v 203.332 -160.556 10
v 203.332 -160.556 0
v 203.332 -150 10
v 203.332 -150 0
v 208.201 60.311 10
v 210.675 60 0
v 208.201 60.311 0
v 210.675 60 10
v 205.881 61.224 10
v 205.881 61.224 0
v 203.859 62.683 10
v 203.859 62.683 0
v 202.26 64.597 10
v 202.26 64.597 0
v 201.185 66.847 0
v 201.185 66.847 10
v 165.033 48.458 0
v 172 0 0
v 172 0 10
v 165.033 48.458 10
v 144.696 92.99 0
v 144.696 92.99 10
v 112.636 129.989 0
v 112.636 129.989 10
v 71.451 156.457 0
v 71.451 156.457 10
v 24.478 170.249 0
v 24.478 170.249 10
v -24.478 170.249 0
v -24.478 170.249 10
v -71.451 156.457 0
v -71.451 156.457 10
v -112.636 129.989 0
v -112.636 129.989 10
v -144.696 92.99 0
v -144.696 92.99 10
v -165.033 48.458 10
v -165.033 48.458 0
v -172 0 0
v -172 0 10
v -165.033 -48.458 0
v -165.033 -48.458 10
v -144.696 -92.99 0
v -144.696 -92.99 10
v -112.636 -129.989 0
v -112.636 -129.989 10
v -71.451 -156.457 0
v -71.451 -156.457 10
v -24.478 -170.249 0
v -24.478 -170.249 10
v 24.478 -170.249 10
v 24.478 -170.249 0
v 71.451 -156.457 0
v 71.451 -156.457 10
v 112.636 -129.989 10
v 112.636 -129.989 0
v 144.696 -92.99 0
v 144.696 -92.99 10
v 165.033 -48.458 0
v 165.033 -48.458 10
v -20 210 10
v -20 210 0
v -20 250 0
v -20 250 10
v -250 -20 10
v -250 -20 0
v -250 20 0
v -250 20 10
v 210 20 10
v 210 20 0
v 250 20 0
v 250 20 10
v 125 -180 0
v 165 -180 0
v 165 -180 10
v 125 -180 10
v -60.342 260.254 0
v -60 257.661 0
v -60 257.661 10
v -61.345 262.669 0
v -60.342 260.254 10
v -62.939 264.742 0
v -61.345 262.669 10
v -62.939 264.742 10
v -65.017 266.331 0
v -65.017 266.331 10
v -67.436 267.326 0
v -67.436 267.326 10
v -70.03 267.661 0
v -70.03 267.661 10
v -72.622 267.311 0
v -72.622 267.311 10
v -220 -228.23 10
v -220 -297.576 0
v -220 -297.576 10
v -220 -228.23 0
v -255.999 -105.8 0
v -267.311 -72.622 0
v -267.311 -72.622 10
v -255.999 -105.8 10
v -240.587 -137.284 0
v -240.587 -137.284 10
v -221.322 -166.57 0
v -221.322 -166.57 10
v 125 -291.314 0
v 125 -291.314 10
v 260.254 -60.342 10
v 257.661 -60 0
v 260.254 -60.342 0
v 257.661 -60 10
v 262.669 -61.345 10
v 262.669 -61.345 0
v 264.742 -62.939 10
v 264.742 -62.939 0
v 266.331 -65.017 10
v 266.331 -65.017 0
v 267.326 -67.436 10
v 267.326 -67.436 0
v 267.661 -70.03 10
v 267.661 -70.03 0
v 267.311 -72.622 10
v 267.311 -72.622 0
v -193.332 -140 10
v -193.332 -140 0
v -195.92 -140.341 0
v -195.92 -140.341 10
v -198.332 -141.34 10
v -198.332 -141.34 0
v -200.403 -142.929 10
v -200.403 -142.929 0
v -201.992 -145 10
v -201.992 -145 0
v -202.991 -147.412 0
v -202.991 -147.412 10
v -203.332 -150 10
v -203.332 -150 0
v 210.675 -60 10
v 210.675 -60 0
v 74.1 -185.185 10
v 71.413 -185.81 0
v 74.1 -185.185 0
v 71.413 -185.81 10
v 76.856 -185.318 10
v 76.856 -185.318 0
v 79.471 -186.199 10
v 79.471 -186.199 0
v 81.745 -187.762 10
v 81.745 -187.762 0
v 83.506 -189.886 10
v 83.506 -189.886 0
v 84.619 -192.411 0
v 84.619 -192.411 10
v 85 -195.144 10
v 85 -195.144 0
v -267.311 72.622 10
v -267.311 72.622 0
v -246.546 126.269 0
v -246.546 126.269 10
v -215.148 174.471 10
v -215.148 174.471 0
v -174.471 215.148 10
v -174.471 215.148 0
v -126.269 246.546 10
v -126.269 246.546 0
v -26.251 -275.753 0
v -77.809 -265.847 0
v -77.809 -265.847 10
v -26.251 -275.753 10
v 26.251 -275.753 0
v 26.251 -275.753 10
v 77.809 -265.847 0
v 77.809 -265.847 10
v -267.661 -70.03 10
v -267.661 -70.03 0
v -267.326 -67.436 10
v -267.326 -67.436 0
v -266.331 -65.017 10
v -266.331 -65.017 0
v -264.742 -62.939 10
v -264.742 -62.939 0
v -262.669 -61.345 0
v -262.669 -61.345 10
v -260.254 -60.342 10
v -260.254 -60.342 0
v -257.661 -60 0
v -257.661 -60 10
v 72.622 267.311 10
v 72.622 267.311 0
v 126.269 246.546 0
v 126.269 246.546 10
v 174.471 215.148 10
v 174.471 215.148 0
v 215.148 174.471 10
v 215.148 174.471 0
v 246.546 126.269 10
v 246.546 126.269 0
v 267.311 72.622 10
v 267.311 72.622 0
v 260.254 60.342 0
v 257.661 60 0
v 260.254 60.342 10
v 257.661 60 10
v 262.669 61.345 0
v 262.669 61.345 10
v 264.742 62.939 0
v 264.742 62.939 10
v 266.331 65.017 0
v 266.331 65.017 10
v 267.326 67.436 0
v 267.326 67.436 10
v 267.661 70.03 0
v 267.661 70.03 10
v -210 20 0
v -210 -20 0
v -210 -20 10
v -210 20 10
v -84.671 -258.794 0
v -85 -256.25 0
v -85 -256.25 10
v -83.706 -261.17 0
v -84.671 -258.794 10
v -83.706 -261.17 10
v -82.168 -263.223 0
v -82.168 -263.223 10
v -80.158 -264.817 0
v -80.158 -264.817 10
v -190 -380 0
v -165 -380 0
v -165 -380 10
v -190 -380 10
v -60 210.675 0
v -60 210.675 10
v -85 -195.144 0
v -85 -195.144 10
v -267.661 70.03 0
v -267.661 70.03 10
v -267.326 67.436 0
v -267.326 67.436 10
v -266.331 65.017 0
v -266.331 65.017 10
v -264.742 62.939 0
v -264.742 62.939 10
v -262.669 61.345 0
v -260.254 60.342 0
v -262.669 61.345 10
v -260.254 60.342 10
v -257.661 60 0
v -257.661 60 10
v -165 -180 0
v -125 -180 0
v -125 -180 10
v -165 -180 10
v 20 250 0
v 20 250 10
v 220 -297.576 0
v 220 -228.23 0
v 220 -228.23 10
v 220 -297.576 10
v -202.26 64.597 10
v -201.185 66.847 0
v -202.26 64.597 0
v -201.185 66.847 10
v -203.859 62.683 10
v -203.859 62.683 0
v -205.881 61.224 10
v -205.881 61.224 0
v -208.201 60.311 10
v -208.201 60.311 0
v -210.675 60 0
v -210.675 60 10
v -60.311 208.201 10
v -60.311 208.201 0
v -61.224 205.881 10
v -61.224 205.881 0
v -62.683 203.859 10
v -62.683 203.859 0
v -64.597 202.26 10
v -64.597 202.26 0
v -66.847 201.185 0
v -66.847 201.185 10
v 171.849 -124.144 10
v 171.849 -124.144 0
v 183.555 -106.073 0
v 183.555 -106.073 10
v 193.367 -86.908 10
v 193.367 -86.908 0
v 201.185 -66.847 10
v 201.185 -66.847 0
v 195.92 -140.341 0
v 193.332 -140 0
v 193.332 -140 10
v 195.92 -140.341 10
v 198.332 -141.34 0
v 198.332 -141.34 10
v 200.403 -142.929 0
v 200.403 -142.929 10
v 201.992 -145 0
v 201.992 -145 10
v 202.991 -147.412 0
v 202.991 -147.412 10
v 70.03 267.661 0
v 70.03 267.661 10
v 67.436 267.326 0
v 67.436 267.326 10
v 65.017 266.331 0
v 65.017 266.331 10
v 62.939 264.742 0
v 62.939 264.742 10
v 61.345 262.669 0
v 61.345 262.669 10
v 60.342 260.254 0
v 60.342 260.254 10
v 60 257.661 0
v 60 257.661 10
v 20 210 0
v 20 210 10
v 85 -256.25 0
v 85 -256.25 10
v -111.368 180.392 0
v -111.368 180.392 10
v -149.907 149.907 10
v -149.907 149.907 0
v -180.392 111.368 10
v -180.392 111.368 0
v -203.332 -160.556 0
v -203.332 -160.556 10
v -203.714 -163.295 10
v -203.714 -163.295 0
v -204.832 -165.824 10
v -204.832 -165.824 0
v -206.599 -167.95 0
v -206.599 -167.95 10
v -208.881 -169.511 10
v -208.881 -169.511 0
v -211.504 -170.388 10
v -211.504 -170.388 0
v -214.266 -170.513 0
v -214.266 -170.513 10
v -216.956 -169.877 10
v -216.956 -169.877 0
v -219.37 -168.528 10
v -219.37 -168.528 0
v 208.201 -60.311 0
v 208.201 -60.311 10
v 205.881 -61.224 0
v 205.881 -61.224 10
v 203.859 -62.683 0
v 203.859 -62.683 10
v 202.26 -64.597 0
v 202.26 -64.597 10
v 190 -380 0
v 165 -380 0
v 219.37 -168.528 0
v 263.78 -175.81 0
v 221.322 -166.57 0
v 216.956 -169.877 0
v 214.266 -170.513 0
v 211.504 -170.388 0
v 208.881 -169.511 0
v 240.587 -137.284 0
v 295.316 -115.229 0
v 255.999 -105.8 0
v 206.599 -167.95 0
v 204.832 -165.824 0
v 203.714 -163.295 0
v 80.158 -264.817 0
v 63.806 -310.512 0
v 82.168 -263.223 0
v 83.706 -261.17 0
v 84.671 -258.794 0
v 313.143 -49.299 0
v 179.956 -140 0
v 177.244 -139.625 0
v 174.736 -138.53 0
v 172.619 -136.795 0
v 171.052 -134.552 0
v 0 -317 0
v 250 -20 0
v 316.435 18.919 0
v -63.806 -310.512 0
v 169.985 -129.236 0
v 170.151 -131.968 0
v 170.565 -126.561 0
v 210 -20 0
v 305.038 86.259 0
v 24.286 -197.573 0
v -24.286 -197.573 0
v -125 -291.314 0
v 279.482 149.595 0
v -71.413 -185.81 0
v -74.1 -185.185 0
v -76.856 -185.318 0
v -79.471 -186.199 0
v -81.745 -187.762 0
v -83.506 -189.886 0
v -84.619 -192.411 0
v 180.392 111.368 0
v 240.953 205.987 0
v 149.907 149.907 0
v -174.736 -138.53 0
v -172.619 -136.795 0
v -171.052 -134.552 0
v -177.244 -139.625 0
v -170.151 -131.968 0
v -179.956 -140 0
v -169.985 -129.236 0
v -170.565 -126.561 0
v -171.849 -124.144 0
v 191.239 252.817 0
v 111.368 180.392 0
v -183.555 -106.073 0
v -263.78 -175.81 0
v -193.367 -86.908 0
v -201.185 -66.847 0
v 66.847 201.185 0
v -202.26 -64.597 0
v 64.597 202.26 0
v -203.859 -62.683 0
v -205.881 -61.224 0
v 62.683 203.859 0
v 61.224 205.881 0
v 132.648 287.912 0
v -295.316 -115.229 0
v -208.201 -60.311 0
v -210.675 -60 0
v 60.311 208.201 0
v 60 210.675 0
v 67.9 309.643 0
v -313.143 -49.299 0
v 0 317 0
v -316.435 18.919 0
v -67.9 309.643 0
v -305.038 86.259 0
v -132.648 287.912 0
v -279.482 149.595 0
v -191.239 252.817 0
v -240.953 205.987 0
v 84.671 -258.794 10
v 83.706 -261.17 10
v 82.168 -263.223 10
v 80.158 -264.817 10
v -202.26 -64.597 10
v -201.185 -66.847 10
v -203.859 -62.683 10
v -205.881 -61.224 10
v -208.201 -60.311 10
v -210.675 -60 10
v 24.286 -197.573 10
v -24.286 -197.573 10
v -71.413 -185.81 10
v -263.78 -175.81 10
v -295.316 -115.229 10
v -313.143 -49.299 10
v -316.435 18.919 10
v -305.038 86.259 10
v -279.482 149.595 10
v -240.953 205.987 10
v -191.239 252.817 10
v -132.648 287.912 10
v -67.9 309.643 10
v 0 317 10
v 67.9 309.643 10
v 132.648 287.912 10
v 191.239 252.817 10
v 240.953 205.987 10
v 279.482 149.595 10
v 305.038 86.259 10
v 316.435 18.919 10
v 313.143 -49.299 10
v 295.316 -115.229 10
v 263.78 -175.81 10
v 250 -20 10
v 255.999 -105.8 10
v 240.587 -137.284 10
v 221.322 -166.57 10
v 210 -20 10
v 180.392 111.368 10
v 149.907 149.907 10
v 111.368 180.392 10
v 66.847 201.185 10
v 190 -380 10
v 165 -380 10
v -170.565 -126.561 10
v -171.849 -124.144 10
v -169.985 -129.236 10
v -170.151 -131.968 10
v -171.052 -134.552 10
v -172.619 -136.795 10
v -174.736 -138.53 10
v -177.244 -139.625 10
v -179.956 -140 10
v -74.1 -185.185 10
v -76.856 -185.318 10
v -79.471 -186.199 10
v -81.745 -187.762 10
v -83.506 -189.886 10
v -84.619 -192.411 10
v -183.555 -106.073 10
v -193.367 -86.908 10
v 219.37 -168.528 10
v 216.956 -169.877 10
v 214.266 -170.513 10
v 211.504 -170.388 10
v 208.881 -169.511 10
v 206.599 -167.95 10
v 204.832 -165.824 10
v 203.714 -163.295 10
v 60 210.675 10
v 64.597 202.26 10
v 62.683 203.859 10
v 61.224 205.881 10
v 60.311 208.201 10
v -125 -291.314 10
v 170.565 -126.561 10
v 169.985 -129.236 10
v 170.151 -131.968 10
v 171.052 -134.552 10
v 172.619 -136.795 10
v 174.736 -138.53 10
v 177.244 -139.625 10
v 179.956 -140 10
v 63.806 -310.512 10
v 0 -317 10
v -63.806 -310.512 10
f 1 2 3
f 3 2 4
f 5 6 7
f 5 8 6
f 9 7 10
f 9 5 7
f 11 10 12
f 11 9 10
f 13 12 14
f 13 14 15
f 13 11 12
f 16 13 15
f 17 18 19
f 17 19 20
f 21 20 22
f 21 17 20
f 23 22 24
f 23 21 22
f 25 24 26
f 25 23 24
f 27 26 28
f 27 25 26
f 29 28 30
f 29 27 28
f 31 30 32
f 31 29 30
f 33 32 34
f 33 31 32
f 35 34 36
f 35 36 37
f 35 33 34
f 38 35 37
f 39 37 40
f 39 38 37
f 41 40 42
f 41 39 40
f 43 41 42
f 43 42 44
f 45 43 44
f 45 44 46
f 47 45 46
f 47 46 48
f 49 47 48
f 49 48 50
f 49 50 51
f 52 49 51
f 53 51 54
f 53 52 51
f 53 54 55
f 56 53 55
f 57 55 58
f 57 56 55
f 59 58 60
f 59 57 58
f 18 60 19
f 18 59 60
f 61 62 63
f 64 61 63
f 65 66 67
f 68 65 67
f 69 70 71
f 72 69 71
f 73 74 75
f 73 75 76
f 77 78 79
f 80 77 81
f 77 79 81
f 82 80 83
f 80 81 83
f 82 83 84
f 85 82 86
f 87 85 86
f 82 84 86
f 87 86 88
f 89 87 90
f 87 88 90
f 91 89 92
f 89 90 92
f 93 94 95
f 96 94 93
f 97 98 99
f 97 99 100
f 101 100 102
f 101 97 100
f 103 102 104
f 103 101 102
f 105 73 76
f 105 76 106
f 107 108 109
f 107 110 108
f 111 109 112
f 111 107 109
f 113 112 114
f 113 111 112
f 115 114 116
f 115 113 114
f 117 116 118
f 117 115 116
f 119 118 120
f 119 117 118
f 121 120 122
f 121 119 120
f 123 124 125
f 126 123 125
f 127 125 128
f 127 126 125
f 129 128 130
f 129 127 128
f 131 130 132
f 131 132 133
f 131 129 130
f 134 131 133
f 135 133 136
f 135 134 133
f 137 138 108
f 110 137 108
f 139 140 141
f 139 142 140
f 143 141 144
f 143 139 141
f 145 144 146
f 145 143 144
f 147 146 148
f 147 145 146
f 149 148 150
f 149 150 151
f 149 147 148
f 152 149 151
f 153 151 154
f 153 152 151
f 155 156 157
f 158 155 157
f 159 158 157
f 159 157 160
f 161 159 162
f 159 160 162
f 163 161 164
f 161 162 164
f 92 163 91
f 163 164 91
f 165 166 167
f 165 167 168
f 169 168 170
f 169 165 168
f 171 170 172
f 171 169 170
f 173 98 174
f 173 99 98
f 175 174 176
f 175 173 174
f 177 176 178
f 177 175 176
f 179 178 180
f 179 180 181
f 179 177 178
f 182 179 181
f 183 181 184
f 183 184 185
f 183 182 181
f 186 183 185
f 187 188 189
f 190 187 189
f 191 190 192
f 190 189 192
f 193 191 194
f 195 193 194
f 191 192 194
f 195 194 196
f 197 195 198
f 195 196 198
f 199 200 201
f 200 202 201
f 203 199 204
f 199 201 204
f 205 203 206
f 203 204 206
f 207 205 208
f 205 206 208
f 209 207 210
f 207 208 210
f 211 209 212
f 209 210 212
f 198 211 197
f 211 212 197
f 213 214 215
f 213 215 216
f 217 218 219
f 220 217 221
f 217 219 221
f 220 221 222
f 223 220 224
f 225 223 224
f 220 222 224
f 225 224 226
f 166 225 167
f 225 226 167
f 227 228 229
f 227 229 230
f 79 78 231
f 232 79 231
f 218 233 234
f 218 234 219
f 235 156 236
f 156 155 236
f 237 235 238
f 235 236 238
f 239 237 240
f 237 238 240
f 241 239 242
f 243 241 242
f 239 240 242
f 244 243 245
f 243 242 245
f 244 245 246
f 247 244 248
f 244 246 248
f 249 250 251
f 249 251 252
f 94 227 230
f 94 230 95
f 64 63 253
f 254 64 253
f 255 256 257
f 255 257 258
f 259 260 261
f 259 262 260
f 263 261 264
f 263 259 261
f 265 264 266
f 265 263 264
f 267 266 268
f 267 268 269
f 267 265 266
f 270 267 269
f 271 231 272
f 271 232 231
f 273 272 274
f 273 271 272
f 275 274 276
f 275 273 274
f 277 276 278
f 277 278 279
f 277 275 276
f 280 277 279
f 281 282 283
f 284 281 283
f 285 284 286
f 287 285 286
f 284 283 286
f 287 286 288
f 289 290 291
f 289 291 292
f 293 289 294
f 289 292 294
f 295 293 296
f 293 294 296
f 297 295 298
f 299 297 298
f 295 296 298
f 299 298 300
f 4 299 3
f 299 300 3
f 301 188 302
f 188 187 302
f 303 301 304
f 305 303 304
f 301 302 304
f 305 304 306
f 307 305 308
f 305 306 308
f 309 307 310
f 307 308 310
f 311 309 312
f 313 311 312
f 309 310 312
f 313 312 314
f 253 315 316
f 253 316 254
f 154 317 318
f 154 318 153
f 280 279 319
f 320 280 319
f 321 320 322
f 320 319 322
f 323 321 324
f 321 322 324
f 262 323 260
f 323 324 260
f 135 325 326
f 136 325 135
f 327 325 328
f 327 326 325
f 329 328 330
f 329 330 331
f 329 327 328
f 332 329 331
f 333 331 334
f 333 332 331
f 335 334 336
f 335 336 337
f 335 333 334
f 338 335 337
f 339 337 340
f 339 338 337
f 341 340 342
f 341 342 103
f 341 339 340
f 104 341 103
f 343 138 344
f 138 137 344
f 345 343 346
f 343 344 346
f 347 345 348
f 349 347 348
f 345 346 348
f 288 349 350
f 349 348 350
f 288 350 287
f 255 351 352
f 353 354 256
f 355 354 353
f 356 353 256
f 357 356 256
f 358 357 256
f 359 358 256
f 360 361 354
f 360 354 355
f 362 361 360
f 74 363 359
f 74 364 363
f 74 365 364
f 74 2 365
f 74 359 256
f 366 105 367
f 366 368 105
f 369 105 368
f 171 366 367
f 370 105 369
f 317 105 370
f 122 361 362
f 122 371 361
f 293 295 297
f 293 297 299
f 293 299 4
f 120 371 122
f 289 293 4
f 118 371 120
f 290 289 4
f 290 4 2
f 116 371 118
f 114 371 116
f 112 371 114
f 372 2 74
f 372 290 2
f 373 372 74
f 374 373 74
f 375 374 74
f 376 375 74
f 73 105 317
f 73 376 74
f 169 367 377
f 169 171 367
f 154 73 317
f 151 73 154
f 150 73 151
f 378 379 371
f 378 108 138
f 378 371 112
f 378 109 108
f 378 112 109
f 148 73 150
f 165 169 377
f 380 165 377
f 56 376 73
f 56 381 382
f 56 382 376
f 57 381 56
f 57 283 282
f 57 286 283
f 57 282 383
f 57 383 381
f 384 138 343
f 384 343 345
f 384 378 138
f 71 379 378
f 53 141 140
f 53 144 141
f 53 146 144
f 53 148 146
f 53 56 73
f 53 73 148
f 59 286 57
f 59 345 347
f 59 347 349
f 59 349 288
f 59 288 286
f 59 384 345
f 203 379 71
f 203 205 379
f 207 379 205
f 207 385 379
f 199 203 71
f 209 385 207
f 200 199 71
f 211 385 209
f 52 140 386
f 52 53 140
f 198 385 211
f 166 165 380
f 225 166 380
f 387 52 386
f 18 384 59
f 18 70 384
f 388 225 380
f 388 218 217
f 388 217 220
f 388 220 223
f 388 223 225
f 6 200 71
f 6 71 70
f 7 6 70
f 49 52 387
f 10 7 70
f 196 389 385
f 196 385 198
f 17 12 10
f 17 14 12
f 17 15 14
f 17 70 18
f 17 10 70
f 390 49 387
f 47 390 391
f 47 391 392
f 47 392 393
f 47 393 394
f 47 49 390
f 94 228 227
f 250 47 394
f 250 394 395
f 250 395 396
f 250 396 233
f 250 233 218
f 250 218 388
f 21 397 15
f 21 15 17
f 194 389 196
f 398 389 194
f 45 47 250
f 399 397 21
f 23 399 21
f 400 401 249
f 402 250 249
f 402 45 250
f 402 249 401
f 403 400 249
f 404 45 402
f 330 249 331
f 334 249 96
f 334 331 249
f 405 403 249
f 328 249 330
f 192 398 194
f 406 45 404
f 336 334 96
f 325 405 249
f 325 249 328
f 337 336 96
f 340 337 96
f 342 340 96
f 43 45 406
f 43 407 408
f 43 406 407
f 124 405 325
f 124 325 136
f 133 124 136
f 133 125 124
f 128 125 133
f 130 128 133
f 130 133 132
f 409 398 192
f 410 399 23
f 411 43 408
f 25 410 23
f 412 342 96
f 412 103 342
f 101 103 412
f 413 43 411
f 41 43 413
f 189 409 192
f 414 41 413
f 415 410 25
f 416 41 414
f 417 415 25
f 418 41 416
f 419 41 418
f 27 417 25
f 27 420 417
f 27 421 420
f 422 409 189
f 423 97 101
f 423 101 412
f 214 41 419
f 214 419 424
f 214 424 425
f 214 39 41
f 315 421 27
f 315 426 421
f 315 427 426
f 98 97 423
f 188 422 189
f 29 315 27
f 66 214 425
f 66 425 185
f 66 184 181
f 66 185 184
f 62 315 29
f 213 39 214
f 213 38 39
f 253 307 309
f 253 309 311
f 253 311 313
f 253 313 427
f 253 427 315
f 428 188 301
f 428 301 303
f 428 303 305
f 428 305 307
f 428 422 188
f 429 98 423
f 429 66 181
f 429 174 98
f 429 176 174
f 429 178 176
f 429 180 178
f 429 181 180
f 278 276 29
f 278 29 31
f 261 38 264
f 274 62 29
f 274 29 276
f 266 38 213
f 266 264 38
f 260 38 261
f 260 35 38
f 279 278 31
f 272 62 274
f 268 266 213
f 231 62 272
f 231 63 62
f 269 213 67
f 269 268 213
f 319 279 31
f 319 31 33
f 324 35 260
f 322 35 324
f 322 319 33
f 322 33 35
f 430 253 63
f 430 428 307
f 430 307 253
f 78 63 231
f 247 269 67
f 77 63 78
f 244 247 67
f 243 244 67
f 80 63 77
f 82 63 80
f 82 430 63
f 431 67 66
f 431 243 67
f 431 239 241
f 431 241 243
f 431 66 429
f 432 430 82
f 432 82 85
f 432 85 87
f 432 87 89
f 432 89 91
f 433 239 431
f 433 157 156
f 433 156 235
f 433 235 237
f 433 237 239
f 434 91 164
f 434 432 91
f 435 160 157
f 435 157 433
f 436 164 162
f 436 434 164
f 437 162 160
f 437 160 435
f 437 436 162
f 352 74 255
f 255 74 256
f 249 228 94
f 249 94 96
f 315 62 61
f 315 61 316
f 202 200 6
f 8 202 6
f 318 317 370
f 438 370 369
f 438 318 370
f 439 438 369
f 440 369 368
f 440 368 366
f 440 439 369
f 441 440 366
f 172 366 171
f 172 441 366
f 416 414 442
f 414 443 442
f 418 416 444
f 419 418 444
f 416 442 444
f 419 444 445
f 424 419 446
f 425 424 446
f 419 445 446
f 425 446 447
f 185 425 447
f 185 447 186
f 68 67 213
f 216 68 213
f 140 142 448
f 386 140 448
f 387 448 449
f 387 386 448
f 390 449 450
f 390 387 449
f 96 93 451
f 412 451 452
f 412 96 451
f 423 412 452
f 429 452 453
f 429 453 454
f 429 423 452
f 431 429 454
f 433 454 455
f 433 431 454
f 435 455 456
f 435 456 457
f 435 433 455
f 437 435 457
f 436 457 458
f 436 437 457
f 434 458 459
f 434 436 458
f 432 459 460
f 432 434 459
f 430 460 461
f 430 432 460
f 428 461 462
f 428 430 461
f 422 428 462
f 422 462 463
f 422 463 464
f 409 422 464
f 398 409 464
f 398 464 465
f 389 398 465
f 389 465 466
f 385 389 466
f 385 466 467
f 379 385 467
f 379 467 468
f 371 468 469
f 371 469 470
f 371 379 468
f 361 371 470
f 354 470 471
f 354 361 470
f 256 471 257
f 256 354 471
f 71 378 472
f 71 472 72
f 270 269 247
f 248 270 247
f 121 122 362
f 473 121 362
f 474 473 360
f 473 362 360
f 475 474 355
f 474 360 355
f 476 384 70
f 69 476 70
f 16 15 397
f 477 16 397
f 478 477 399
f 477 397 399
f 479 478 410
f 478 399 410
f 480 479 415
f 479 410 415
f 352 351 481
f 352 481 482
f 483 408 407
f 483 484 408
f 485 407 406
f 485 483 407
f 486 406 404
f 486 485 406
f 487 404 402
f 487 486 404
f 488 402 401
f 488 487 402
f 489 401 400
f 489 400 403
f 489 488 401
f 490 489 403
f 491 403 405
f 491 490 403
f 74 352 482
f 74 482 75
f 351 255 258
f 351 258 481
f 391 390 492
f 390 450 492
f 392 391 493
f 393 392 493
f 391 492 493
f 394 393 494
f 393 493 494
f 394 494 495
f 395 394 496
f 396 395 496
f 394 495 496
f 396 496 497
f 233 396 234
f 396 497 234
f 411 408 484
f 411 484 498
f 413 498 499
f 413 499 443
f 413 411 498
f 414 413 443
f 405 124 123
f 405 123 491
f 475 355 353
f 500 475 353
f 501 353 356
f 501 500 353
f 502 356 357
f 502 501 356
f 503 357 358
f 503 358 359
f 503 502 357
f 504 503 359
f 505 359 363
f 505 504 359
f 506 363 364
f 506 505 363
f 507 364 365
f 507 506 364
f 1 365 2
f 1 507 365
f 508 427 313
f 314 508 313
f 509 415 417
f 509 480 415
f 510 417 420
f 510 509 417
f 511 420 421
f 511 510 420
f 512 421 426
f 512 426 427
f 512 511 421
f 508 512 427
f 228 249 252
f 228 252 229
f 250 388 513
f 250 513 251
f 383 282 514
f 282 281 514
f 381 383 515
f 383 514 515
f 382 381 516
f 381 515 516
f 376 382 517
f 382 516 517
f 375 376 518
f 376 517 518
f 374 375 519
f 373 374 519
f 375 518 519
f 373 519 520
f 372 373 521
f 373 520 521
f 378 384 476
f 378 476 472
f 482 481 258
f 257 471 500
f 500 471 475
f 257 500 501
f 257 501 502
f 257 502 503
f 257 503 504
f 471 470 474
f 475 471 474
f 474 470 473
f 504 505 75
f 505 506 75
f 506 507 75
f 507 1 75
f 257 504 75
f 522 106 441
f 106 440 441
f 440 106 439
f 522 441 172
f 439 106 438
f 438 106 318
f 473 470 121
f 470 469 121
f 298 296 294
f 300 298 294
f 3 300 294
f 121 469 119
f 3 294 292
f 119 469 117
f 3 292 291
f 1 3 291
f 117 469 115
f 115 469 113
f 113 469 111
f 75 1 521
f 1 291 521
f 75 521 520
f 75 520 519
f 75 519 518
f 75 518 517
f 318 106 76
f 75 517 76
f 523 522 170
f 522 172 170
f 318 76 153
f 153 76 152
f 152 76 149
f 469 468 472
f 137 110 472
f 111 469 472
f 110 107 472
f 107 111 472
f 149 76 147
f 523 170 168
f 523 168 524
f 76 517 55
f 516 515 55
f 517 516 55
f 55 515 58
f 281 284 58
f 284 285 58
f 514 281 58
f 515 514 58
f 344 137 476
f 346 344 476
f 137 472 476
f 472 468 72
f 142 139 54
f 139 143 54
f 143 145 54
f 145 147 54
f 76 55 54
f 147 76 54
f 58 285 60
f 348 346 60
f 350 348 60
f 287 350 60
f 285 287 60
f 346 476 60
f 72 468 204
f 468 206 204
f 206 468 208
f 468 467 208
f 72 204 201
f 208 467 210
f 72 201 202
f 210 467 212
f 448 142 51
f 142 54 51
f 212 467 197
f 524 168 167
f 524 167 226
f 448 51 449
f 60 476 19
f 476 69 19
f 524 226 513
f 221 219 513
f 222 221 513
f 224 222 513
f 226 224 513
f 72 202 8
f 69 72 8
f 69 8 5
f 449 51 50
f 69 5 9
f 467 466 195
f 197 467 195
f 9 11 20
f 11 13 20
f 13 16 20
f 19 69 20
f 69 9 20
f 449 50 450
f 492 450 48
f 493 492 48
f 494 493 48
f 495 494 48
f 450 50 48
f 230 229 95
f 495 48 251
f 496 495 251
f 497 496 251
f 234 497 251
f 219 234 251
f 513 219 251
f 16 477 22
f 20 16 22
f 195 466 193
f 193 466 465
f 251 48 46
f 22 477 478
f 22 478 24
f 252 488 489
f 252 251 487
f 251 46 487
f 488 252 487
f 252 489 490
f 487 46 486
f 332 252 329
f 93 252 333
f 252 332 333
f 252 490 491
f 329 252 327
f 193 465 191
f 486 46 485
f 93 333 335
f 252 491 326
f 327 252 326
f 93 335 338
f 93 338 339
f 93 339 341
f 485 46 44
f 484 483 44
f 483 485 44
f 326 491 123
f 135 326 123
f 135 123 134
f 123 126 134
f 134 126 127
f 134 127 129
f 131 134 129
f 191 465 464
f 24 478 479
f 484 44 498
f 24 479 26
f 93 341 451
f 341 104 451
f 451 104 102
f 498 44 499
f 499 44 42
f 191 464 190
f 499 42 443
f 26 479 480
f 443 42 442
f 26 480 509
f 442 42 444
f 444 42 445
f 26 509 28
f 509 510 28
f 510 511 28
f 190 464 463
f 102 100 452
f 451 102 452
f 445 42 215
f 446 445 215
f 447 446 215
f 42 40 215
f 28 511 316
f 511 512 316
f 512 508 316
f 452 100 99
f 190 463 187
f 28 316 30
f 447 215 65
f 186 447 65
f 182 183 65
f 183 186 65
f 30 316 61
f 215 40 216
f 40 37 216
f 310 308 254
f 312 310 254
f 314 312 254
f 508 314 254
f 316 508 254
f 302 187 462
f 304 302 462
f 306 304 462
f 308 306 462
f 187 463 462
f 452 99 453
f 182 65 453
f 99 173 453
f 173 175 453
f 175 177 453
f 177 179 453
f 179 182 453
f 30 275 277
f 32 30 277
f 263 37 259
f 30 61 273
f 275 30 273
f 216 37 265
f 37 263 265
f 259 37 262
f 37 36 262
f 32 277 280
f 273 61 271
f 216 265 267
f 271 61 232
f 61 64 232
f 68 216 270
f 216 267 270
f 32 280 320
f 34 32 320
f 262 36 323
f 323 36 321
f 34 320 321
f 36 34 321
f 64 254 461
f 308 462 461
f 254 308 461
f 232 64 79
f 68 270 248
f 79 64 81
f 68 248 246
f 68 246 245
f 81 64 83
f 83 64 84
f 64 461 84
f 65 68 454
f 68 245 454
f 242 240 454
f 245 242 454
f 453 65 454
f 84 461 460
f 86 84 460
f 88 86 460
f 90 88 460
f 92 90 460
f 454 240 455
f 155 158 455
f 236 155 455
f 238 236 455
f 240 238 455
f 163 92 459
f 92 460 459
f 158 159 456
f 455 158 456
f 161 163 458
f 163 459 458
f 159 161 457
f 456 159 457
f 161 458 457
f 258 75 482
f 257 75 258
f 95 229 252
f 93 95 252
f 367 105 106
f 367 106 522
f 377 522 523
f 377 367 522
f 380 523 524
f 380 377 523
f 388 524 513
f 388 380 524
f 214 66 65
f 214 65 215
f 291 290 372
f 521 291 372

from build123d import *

# Parameters (mm, degrees)
ESQUISSE1_R        = 172
ESQUISSE1_W        = 40
ESQUISSE1_H        = 40
BOSS_EXTRU_1_DEPTH = 10
CONG_1_R           = 10


with BuildPart() as part:
    # Esquisse1 → Boss.-Extru.1 (new body)
    with BuildSketch(Plane.XY):
        with BuildLine():
            Line((220, -228.230147001), (220, -297.575677416))
            Line((220, -297.575677416), (190, -380))
            Line((190, -380), (165, -380))
            Line((165, -380), (165, -180))
            Line((165, -180), (125, -180))
            Line((125, -180), (125, -291.314263297))
            ThreePointArc((125, -291.314263297), (0, -317), (-125, -291.314263297))
            Line((-125, -291.314263297), (-125, -180))
            Line((-125, -180), (-165, -180))
            Line((-165, -180), (-165, -380))
            Line((-165, -380), (-190, -380))
            Line((-190, -380), (-220, -297.575677416))
            Line((-220, -297.575677416), (-220, -228.230147001))
            ThreePointArc((-220, -228.230147001), (0, 317), (220, -228.230147001))
        make_face()
        Circle(ESQUISSE1_R, mode=Mode.SUBTRACT)
        with Locations((230, 0)):
            Rectangle(ESQUISSE1_W, ESQUISSE1_H, mode=Mode.SUBTRACT)
        with BuildLine():
            Line((270.423741561, 60), (203.332240434, 60))
            ThreePointArc((203.332240434, 60), (149.906637612, 149.906637612), (60, 203.332240434))
            Line((60, 203.332240434), (60, 270.423741561))
            ThreePointArc((60, 270.423741561), (195.868578389, 195.868578389), (270.423741561, 60))
        make_face(mode=Mode.SUBTRACT)
        with BuildLine():
            Line((-60, 270.423741561), (-60, 203.332240434))
            ThreePointArc((-60, 203.332240434), (-149.906637612, 149.906637612), (-203.332240434, 60))
            Line((-203.332240434, 60), (-270.423741561, 60))
            ThreePointArc((-270.423741561, 60), (-195.868578389, 195.868578389), (-60, 270.423741561))
        make_face(mode=Mode.SUBTRACT)
        with BuildLine():
            Line((203.332240434, -60), (270.423741561, -60))
            ThreePointArc((270.423741561, -60), (245.385741824, -128.510068513), (203.332240434, -188.109010948))
            Line((203.332240434, -188.109010948), (203.332240434, -140))
            Line((203.332240434, -140), (159.197989937, -140))
            ThreePointArc((159.197989937, -140), (185.626081097, -102.405849524), (203.332240434, -60))
        make_face(mode=Mode.SUBTRACT)
        with Locations((-230, 0)):
            Rectangle(ESQUISSE1_W, ESQUISSE1_H, mode=Mode.SUBTRACT)
        with Locations((0, 230)):
            Rectangle(ESQUISSE1_W, ESQUISSE1_H, mode=Mode.SUBTRACT)
        with BuildLine():
            Line((-85, -180), (-85, -263.636112853))
            ThreePointArc((-85, -263.636112853), (0, -277), (85, -263.636112853))
            Line((85, -263.636112853), (85, -180))
            ThreePointArc((85, -180), (0, -199.060292374), (-85, -180))
        make_face(mode=Mode.SUBTRACT)
        with BuildLine():
            Line((-203.332240434, -60), (-270.423741561, -60))
            ThreePointArc((-270.423741561, -60), (-245.385741824, -128.510068513), (-203.332240434, -188.109010948))
            Line((-203.332240434, -188.109010948), (-203.332240434, -140))
            Line((-203.332240434, -140), (-159.197989937, -140))
            ThreePointArc((-159.197989937, -140), (-185.626081097, -102.405849524), (-203.332240434, -60))
        make_face(mode=Mode.SUBTRACT)
    extrude(amount=BOSS_EXTRU_1_DEPTH)

    # Congé1
    cong_1_edges = [part.edges().sort_by_distance(p)[0] for p in [
        (270.423741561, 60, 5),
        (60, 270.423741561, 5),
        (60, 203.332240434, 5),
        (203.332240434, 60, 5),
        (-60, 270.423741561, 5),
        (-270.423741561, 60, 5),
        (-203.332240434, 60, 5),
        (-60, 203.332240434, 5),
        (85, -180, 5),
        (-85, -180, 5),
        (-85, -263.636112853, 5),
        (85, -263.636112853, 5),
        (203.332240434, -60, 5),
        (159.197989937, -140, 5),
        (203.332240434, -140, 5),
        (203.332240434, -188.109010948, 5),
        (270.423741561, -60, 5),
        (-159.197989937, -140, 5),
        (-203.332240434, -60, 5),
        (-270.423741561, -60, 5),
        (-203.332240434, -188.109010948, 5),
        (-203.332240434, -140, 5),
    ]]
    fillet(cong_1_edges, radius=CONG_1_R)


solid = part.part
